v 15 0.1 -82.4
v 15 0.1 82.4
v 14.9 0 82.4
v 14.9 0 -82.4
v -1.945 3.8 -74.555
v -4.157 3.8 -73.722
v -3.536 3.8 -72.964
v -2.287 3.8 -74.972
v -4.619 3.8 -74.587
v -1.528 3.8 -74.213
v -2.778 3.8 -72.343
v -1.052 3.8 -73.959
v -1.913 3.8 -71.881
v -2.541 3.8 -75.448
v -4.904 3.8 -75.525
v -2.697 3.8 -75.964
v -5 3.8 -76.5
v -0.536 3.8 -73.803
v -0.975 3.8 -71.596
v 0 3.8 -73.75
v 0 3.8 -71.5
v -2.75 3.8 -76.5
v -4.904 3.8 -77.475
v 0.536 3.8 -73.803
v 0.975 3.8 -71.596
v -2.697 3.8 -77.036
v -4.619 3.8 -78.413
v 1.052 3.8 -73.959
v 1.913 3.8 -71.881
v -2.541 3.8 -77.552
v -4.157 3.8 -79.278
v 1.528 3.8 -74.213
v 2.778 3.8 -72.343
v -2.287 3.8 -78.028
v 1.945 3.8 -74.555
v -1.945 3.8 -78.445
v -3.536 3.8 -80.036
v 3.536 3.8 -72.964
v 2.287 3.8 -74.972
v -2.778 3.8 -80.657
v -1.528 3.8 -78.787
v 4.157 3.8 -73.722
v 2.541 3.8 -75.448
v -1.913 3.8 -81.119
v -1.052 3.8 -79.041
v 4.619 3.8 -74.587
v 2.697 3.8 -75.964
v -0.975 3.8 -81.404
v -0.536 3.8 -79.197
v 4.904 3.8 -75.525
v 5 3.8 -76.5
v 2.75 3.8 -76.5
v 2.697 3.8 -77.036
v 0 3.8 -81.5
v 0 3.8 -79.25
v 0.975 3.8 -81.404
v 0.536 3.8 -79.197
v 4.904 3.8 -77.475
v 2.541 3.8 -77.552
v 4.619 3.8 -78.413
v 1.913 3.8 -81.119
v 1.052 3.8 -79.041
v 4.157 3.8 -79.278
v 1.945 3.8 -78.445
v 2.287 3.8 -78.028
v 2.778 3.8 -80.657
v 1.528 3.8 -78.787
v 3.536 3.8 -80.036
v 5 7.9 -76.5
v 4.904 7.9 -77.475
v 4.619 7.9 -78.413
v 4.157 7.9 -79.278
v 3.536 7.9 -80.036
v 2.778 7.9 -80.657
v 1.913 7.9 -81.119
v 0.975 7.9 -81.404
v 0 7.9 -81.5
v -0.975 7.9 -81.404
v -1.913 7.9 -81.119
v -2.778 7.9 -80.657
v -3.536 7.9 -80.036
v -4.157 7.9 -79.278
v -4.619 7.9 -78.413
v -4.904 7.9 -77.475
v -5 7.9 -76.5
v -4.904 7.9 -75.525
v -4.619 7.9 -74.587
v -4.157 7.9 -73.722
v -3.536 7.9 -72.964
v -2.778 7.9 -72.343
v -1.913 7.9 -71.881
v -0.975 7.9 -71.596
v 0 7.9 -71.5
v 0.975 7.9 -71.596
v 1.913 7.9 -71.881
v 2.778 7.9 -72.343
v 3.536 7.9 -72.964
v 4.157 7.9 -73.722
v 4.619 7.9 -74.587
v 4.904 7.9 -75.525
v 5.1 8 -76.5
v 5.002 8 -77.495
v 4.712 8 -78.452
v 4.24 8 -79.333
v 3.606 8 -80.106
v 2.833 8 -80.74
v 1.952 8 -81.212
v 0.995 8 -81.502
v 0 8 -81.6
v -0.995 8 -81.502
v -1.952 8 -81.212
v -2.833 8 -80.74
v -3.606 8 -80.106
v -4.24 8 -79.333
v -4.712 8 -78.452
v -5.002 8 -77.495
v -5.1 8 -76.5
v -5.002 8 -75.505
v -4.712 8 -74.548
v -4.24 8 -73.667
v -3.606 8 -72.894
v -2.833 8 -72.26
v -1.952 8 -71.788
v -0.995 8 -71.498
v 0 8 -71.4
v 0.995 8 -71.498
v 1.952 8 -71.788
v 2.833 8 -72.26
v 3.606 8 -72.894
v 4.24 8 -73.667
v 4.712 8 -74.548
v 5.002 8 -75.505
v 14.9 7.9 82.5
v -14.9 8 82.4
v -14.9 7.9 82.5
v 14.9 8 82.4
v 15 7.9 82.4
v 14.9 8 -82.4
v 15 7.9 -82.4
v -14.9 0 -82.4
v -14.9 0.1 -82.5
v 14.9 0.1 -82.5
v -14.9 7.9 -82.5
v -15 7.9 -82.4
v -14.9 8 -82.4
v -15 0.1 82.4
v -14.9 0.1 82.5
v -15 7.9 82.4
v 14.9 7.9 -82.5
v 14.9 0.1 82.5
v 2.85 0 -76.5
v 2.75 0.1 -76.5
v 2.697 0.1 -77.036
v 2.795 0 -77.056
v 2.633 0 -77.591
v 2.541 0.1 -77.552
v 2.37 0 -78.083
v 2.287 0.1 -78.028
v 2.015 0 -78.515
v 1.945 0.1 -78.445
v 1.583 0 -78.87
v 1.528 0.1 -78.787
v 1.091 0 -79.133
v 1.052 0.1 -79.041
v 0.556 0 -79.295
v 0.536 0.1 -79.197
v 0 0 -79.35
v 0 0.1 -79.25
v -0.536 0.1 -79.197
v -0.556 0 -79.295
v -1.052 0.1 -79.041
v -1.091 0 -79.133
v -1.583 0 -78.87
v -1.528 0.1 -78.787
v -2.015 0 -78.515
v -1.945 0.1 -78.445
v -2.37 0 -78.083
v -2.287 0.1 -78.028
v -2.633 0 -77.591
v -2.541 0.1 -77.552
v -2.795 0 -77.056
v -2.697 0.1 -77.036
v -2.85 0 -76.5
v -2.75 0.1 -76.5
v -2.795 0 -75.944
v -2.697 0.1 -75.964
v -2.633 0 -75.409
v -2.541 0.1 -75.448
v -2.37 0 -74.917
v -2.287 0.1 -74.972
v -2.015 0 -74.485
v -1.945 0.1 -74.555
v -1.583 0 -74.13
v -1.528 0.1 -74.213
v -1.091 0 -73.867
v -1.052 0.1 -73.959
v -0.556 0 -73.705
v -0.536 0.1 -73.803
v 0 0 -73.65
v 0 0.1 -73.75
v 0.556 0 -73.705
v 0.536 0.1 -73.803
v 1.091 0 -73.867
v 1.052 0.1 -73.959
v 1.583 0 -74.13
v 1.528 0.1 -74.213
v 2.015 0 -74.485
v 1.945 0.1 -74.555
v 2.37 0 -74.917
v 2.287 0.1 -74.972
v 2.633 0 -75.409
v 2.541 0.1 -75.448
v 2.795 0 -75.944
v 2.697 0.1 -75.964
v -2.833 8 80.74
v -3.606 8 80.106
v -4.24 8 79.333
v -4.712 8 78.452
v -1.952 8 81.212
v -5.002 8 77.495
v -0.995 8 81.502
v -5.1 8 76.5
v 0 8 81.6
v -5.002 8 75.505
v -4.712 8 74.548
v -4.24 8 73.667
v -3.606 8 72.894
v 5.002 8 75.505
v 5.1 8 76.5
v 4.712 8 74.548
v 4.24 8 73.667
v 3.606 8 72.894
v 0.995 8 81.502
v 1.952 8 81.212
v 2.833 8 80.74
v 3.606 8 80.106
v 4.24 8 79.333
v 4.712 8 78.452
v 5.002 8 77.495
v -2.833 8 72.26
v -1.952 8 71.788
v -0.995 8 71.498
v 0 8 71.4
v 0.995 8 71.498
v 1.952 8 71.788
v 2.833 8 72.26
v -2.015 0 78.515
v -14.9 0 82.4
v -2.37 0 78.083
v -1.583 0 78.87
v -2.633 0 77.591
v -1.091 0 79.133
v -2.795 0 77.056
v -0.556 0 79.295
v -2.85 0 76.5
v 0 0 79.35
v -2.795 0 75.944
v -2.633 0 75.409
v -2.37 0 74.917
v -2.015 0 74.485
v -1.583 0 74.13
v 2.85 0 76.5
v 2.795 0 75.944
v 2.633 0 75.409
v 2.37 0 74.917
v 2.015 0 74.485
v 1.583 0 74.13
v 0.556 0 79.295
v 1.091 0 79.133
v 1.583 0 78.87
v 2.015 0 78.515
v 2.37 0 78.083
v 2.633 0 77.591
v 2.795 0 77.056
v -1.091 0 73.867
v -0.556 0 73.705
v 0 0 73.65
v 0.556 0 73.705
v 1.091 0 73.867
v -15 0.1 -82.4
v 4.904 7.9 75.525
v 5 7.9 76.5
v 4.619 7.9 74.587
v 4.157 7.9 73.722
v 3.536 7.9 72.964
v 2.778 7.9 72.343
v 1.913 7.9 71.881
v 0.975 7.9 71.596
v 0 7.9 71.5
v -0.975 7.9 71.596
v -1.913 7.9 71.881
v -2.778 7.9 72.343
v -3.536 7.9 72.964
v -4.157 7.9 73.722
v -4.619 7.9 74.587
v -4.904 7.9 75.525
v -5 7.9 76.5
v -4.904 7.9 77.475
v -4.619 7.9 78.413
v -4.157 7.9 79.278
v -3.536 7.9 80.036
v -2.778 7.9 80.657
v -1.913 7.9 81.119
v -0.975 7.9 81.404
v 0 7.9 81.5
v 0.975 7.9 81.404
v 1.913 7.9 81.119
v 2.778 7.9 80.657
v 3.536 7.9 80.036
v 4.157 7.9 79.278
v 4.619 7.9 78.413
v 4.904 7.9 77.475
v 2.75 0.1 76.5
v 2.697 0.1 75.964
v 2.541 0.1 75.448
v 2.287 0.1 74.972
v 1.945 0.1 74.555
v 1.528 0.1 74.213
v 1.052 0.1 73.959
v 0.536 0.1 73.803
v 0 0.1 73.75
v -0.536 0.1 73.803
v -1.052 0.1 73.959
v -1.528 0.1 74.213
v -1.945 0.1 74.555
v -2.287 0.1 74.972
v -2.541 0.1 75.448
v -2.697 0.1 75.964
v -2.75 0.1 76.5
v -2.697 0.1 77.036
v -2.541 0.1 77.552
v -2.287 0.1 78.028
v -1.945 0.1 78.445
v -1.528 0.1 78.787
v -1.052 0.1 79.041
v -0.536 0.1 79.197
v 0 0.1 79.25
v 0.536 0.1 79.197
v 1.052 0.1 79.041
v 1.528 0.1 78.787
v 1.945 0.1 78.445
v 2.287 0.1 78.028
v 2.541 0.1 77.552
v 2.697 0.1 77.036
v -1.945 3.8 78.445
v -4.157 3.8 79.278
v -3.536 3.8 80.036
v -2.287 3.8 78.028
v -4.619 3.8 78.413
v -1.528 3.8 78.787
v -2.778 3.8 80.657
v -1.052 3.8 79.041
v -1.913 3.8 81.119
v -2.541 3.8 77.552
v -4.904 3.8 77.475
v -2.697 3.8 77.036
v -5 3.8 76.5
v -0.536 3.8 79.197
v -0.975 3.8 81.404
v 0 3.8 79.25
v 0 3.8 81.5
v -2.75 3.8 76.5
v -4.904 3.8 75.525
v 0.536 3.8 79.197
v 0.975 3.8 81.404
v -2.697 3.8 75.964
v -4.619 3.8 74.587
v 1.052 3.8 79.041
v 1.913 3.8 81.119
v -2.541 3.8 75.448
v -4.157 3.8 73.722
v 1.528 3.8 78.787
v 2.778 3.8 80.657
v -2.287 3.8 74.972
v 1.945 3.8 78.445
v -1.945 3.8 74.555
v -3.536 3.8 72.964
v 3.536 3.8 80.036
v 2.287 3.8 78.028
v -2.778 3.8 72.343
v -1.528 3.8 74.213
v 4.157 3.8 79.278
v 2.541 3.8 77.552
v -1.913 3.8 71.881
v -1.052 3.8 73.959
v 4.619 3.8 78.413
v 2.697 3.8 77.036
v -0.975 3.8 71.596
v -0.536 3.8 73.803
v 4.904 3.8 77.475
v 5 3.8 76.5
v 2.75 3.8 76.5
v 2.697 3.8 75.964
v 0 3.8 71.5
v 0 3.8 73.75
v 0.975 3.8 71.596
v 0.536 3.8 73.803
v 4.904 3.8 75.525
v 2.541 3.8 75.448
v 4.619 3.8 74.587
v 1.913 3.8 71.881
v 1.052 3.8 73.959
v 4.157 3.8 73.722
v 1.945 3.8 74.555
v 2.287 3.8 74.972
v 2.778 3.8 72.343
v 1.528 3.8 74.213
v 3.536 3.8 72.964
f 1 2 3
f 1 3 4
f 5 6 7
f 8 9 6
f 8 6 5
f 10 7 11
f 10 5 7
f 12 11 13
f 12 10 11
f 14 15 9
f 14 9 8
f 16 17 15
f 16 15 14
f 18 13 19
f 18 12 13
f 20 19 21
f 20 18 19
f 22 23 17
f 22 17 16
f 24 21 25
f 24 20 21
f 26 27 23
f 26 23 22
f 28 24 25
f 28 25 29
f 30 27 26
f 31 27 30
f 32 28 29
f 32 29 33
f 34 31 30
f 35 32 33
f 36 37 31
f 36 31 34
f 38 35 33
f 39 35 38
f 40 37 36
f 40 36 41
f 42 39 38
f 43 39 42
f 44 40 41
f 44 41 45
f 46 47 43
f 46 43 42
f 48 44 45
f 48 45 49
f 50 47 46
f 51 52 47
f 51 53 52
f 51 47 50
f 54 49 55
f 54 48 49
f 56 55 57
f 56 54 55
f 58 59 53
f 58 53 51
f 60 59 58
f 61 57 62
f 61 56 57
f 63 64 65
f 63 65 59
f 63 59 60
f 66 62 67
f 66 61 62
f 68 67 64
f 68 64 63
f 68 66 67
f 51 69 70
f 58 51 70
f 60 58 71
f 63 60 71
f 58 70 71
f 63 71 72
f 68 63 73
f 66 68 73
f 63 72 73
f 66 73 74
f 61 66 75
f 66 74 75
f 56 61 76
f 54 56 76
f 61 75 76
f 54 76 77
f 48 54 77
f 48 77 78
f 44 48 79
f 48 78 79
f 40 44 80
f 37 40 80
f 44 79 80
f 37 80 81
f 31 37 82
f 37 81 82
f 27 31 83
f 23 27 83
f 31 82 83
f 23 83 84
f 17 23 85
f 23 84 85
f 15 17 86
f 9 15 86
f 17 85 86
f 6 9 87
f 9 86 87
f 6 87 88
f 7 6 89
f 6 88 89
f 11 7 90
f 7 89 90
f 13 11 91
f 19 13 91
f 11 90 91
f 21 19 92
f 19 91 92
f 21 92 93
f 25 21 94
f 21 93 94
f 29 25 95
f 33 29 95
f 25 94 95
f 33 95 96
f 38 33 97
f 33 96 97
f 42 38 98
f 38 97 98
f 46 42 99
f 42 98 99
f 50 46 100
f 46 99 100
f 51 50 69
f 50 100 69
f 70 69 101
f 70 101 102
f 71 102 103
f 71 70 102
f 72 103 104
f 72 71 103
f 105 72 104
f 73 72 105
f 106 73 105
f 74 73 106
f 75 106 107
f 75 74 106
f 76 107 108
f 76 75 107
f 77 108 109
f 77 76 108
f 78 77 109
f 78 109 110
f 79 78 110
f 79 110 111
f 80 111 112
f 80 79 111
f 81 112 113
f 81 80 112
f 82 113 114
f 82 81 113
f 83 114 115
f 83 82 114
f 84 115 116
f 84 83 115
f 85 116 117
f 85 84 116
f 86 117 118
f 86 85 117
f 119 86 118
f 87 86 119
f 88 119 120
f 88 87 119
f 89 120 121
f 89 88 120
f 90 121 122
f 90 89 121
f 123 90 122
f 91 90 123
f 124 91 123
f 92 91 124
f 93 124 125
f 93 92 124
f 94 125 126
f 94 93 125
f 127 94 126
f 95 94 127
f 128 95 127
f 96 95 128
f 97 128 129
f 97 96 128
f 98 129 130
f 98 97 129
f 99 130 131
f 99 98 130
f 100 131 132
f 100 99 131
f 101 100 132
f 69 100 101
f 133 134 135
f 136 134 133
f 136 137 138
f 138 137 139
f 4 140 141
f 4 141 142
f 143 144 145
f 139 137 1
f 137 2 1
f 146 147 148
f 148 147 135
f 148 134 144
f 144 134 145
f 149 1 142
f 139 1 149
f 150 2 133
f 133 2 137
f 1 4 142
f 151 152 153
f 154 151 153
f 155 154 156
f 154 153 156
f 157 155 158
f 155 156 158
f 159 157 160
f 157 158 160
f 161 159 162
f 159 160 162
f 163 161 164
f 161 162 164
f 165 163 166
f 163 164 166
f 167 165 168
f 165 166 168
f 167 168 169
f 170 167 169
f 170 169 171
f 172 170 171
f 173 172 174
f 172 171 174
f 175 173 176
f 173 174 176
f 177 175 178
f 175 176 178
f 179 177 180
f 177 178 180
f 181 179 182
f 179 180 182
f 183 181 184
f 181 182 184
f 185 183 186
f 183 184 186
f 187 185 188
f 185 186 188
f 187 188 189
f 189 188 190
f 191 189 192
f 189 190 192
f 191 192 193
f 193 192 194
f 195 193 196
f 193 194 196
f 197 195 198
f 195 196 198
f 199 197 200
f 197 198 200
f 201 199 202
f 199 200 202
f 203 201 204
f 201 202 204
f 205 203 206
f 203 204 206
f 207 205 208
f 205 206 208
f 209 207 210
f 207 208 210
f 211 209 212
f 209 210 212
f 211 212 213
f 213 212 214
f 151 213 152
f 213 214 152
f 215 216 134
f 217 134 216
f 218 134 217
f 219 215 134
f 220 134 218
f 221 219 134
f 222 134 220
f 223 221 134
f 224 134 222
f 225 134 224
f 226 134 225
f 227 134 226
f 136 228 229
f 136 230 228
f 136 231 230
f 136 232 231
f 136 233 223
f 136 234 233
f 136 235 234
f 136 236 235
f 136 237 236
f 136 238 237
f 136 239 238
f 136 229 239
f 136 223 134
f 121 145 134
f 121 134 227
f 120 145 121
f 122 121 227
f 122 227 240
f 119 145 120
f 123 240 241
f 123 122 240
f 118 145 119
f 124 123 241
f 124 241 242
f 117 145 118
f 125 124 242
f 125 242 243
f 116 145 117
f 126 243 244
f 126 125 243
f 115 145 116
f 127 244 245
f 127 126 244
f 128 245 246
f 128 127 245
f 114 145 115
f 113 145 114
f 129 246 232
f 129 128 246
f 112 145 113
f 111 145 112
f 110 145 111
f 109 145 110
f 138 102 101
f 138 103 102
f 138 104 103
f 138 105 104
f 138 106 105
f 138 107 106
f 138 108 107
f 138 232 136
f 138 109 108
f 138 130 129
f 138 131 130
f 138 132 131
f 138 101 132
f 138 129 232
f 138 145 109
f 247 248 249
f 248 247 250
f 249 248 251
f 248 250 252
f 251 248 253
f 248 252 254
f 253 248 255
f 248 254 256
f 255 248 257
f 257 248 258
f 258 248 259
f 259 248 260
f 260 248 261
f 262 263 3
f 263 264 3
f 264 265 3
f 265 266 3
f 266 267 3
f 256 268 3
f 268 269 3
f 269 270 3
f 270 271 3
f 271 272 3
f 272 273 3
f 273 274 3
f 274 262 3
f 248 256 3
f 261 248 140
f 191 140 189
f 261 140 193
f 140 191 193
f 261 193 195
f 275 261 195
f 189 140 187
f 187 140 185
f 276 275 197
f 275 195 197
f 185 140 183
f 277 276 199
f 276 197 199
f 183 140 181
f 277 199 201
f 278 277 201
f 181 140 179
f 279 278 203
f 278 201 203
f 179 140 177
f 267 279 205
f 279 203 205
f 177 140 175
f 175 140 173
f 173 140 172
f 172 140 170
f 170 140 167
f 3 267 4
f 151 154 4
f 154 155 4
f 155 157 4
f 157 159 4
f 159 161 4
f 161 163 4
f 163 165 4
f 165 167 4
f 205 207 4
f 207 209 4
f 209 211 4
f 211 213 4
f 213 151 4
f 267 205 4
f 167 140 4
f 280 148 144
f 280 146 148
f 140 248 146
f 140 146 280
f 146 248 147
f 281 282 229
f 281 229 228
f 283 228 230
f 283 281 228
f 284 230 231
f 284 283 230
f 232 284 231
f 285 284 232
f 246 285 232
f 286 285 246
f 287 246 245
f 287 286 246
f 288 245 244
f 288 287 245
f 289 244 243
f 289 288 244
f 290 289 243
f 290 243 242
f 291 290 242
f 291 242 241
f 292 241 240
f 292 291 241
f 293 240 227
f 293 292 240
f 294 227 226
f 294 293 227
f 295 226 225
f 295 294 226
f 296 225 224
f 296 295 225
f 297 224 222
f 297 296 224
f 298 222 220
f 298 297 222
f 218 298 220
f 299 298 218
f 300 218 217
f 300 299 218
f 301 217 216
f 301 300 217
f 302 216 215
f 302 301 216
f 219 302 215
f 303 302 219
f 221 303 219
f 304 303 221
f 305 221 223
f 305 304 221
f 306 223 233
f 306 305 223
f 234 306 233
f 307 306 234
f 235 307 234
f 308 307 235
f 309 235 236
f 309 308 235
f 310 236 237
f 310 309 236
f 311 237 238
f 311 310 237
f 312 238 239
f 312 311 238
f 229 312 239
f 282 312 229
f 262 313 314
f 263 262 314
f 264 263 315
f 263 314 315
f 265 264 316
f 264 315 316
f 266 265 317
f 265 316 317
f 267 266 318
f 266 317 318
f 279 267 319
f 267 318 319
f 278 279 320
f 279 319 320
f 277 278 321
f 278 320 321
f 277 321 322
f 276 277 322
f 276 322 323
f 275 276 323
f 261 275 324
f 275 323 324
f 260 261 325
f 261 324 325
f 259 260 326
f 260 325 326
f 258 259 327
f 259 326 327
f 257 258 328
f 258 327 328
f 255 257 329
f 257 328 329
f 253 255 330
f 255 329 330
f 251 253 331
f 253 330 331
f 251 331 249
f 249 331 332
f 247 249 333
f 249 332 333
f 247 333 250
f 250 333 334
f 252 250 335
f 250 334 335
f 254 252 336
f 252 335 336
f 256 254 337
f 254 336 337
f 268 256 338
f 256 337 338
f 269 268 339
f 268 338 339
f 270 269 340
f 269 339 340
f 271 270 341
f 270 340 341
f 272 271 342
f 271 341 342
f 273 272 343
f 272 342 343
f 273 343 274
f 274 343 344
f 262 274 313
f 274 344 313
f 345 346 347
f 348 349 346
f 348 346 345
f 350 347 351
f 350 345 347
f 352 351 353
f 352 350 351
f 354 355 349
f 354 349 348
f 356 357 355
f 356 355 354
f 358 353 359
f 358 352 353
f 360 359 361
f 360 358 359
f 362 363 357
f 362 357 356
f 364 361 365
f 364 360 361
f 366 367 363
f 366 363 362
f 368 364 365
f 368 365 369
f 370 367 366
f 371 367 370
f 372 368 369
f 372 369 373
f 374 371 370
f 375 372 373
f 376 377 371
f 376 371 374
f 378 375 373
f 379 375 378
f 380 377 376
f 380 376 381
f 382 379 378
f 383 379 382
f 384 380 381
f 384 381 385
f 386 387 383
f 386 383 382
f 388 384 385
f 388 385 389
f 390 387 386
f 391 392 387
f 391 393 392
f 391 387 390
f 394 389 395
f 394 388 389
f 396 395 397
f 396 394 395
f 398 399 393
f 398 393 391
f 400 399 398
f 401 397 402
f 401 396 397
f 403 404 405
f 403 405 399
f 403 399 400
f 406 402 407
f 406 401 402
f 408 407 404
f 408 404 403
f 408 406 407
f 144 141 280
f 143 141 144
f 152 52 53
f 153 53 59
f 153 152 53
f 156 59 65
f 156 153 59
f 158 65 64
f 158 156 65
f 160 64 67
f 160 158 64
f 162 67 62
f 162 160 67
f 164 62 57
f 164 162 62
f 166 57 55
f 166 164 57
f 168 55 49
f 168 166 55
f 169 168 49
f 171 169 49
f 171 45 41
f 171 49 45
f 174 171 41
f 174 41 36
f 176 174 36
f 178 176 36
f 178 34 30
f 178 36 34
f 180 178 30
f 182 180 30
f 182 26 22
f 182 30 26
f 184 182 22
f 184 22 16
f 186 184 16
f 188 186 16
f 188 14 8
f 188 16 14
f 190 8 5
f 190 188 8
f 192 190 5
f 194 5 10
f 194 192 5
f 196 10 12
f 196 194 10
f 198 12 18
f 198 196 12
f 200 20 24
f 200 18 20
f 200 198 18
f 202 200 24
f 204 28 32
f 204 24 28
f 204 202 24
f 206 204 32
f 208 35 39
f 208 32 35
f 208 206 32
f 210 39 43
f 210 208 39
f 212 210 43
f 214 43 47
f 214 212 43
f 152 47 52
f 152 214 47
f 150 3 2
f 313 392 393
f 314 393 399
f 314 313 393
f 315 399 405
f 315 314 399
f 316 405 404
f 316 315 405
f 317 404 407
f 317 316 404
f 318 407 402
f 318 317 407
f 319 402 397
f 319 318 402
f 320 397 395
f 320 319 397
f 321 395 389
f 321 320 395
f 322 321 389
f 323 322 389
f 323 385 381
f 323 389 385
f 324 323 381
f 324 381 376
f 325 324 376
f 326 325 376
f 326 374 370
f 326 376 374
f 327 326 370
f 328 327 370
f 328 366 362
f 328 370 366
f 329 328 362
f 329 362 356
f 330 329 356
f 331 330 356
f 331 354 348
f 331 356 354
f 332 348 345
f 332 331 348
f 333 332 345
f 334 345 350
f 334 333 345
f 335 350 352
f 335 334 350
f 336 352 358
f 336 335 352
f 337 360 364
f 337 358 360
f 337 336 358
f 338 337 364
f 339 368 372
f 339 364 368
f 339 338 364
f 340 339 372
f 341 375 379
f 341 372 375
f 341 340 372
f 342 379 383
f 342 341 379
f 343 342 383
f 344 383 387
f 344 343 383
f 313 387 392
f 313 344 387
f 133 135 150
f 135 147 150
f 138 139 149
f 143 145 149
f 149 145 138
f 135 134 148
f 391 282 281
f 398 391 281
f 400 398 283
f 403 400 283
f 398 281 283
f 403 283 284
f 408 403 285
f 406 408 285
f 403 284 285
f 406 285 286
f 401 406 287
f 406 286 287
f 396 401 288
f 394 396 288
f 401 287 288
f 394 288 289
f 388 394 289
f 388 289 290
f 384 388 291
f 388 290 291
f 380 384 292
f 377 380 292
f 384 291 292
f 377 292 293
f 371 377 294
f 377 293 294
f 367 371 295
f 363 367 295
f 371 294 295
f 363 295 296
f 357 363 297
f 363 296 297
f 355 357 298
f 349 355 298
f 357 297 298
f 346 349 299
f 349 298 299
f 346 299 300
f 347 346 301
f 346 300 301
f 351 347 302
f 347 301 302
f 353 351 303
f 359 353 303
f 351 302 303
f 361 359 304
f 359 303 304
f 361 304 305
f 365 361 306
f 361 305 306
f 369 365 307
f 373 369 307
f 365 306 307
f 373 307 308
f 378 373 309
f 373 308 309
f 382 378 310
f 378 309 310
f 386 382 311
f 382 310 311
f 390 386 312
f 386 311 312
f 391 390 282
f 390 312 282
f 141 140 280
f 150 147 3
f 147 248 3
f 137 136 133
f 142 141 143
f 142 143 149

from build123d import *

# Parameters (mm, degrees)
SKETCH1_W           = 30
SKETCH1_H           = 165
SKETCH1_R           = 2.75
BOSS_EXTRUDE2_DEPTH = 8
SKETCH3_R           = 5
CUT_EXTRUDE1_DEPTH  = 4.2
CHAMFER1_SIZE       = 0.1


with BuildPart() as part:
    # Sketch1 → Boss-Extrude2 (new body)
    with BuildSketch(Plane(origin=(0, 0, 0), x_dir=(1, 0, 0), z_dir=(0, 1, 0))):
        Rectangle(SKETCH1_W, SKETCH1_H)
        with Locations((0, 76.5)):
            Circle(SKETCH1_R, mode=Mode.SUBTRACT)
        with Locations((0, -76.5)):
            Circle(SKETCH1_R, mode=Mode.SUBTRACT)
    extrude(amount=BOSS_EXTRUDE2_DEPTH)

    # Sketch3 → Cut-Extrude1 (cut)
    with BuildSketch(Plane(origin=(0, 8, 0), x_dir=(1, 0, 0), z_dir=(0, 1, 0))):
        with Locations((0, 76.5)):
            Circle(SKETCH3_R)
        with Locations((0, -76.5)):
            Circle(SKETCH3_R)
    extrude(amount=-CUT_EXTRUDE1_DEPTH, mode=Mode.SUBTRACT)

    # Chamfer1
    chamfer1_edges = [part.edges().sort_by_distance(p)[0] for p in [
        (-2.75, 0, -76.5),
        (-15, 8, 0),
        (-2.75, 0, 76.5),
        (0, 8, 82.5),
        (-5, 8, -76.5),
        (-5, 8, 76.5),
        (15, 8, 0),
        (0, 0, 82.5),
        (-15, 0, 0),
        (0, 0, -82.5),
        (15, 0, 0),
        (15, 4, 82.5),
        (-15, 4, 82.5),
        (-15, 4, -82.5),
        (15, 4, -82.5),
        (0, 8, -82.5),
    ]]
    chamfer(chamfer1_edges, length=CHAMFER1_SIZE)


solid = part.part
